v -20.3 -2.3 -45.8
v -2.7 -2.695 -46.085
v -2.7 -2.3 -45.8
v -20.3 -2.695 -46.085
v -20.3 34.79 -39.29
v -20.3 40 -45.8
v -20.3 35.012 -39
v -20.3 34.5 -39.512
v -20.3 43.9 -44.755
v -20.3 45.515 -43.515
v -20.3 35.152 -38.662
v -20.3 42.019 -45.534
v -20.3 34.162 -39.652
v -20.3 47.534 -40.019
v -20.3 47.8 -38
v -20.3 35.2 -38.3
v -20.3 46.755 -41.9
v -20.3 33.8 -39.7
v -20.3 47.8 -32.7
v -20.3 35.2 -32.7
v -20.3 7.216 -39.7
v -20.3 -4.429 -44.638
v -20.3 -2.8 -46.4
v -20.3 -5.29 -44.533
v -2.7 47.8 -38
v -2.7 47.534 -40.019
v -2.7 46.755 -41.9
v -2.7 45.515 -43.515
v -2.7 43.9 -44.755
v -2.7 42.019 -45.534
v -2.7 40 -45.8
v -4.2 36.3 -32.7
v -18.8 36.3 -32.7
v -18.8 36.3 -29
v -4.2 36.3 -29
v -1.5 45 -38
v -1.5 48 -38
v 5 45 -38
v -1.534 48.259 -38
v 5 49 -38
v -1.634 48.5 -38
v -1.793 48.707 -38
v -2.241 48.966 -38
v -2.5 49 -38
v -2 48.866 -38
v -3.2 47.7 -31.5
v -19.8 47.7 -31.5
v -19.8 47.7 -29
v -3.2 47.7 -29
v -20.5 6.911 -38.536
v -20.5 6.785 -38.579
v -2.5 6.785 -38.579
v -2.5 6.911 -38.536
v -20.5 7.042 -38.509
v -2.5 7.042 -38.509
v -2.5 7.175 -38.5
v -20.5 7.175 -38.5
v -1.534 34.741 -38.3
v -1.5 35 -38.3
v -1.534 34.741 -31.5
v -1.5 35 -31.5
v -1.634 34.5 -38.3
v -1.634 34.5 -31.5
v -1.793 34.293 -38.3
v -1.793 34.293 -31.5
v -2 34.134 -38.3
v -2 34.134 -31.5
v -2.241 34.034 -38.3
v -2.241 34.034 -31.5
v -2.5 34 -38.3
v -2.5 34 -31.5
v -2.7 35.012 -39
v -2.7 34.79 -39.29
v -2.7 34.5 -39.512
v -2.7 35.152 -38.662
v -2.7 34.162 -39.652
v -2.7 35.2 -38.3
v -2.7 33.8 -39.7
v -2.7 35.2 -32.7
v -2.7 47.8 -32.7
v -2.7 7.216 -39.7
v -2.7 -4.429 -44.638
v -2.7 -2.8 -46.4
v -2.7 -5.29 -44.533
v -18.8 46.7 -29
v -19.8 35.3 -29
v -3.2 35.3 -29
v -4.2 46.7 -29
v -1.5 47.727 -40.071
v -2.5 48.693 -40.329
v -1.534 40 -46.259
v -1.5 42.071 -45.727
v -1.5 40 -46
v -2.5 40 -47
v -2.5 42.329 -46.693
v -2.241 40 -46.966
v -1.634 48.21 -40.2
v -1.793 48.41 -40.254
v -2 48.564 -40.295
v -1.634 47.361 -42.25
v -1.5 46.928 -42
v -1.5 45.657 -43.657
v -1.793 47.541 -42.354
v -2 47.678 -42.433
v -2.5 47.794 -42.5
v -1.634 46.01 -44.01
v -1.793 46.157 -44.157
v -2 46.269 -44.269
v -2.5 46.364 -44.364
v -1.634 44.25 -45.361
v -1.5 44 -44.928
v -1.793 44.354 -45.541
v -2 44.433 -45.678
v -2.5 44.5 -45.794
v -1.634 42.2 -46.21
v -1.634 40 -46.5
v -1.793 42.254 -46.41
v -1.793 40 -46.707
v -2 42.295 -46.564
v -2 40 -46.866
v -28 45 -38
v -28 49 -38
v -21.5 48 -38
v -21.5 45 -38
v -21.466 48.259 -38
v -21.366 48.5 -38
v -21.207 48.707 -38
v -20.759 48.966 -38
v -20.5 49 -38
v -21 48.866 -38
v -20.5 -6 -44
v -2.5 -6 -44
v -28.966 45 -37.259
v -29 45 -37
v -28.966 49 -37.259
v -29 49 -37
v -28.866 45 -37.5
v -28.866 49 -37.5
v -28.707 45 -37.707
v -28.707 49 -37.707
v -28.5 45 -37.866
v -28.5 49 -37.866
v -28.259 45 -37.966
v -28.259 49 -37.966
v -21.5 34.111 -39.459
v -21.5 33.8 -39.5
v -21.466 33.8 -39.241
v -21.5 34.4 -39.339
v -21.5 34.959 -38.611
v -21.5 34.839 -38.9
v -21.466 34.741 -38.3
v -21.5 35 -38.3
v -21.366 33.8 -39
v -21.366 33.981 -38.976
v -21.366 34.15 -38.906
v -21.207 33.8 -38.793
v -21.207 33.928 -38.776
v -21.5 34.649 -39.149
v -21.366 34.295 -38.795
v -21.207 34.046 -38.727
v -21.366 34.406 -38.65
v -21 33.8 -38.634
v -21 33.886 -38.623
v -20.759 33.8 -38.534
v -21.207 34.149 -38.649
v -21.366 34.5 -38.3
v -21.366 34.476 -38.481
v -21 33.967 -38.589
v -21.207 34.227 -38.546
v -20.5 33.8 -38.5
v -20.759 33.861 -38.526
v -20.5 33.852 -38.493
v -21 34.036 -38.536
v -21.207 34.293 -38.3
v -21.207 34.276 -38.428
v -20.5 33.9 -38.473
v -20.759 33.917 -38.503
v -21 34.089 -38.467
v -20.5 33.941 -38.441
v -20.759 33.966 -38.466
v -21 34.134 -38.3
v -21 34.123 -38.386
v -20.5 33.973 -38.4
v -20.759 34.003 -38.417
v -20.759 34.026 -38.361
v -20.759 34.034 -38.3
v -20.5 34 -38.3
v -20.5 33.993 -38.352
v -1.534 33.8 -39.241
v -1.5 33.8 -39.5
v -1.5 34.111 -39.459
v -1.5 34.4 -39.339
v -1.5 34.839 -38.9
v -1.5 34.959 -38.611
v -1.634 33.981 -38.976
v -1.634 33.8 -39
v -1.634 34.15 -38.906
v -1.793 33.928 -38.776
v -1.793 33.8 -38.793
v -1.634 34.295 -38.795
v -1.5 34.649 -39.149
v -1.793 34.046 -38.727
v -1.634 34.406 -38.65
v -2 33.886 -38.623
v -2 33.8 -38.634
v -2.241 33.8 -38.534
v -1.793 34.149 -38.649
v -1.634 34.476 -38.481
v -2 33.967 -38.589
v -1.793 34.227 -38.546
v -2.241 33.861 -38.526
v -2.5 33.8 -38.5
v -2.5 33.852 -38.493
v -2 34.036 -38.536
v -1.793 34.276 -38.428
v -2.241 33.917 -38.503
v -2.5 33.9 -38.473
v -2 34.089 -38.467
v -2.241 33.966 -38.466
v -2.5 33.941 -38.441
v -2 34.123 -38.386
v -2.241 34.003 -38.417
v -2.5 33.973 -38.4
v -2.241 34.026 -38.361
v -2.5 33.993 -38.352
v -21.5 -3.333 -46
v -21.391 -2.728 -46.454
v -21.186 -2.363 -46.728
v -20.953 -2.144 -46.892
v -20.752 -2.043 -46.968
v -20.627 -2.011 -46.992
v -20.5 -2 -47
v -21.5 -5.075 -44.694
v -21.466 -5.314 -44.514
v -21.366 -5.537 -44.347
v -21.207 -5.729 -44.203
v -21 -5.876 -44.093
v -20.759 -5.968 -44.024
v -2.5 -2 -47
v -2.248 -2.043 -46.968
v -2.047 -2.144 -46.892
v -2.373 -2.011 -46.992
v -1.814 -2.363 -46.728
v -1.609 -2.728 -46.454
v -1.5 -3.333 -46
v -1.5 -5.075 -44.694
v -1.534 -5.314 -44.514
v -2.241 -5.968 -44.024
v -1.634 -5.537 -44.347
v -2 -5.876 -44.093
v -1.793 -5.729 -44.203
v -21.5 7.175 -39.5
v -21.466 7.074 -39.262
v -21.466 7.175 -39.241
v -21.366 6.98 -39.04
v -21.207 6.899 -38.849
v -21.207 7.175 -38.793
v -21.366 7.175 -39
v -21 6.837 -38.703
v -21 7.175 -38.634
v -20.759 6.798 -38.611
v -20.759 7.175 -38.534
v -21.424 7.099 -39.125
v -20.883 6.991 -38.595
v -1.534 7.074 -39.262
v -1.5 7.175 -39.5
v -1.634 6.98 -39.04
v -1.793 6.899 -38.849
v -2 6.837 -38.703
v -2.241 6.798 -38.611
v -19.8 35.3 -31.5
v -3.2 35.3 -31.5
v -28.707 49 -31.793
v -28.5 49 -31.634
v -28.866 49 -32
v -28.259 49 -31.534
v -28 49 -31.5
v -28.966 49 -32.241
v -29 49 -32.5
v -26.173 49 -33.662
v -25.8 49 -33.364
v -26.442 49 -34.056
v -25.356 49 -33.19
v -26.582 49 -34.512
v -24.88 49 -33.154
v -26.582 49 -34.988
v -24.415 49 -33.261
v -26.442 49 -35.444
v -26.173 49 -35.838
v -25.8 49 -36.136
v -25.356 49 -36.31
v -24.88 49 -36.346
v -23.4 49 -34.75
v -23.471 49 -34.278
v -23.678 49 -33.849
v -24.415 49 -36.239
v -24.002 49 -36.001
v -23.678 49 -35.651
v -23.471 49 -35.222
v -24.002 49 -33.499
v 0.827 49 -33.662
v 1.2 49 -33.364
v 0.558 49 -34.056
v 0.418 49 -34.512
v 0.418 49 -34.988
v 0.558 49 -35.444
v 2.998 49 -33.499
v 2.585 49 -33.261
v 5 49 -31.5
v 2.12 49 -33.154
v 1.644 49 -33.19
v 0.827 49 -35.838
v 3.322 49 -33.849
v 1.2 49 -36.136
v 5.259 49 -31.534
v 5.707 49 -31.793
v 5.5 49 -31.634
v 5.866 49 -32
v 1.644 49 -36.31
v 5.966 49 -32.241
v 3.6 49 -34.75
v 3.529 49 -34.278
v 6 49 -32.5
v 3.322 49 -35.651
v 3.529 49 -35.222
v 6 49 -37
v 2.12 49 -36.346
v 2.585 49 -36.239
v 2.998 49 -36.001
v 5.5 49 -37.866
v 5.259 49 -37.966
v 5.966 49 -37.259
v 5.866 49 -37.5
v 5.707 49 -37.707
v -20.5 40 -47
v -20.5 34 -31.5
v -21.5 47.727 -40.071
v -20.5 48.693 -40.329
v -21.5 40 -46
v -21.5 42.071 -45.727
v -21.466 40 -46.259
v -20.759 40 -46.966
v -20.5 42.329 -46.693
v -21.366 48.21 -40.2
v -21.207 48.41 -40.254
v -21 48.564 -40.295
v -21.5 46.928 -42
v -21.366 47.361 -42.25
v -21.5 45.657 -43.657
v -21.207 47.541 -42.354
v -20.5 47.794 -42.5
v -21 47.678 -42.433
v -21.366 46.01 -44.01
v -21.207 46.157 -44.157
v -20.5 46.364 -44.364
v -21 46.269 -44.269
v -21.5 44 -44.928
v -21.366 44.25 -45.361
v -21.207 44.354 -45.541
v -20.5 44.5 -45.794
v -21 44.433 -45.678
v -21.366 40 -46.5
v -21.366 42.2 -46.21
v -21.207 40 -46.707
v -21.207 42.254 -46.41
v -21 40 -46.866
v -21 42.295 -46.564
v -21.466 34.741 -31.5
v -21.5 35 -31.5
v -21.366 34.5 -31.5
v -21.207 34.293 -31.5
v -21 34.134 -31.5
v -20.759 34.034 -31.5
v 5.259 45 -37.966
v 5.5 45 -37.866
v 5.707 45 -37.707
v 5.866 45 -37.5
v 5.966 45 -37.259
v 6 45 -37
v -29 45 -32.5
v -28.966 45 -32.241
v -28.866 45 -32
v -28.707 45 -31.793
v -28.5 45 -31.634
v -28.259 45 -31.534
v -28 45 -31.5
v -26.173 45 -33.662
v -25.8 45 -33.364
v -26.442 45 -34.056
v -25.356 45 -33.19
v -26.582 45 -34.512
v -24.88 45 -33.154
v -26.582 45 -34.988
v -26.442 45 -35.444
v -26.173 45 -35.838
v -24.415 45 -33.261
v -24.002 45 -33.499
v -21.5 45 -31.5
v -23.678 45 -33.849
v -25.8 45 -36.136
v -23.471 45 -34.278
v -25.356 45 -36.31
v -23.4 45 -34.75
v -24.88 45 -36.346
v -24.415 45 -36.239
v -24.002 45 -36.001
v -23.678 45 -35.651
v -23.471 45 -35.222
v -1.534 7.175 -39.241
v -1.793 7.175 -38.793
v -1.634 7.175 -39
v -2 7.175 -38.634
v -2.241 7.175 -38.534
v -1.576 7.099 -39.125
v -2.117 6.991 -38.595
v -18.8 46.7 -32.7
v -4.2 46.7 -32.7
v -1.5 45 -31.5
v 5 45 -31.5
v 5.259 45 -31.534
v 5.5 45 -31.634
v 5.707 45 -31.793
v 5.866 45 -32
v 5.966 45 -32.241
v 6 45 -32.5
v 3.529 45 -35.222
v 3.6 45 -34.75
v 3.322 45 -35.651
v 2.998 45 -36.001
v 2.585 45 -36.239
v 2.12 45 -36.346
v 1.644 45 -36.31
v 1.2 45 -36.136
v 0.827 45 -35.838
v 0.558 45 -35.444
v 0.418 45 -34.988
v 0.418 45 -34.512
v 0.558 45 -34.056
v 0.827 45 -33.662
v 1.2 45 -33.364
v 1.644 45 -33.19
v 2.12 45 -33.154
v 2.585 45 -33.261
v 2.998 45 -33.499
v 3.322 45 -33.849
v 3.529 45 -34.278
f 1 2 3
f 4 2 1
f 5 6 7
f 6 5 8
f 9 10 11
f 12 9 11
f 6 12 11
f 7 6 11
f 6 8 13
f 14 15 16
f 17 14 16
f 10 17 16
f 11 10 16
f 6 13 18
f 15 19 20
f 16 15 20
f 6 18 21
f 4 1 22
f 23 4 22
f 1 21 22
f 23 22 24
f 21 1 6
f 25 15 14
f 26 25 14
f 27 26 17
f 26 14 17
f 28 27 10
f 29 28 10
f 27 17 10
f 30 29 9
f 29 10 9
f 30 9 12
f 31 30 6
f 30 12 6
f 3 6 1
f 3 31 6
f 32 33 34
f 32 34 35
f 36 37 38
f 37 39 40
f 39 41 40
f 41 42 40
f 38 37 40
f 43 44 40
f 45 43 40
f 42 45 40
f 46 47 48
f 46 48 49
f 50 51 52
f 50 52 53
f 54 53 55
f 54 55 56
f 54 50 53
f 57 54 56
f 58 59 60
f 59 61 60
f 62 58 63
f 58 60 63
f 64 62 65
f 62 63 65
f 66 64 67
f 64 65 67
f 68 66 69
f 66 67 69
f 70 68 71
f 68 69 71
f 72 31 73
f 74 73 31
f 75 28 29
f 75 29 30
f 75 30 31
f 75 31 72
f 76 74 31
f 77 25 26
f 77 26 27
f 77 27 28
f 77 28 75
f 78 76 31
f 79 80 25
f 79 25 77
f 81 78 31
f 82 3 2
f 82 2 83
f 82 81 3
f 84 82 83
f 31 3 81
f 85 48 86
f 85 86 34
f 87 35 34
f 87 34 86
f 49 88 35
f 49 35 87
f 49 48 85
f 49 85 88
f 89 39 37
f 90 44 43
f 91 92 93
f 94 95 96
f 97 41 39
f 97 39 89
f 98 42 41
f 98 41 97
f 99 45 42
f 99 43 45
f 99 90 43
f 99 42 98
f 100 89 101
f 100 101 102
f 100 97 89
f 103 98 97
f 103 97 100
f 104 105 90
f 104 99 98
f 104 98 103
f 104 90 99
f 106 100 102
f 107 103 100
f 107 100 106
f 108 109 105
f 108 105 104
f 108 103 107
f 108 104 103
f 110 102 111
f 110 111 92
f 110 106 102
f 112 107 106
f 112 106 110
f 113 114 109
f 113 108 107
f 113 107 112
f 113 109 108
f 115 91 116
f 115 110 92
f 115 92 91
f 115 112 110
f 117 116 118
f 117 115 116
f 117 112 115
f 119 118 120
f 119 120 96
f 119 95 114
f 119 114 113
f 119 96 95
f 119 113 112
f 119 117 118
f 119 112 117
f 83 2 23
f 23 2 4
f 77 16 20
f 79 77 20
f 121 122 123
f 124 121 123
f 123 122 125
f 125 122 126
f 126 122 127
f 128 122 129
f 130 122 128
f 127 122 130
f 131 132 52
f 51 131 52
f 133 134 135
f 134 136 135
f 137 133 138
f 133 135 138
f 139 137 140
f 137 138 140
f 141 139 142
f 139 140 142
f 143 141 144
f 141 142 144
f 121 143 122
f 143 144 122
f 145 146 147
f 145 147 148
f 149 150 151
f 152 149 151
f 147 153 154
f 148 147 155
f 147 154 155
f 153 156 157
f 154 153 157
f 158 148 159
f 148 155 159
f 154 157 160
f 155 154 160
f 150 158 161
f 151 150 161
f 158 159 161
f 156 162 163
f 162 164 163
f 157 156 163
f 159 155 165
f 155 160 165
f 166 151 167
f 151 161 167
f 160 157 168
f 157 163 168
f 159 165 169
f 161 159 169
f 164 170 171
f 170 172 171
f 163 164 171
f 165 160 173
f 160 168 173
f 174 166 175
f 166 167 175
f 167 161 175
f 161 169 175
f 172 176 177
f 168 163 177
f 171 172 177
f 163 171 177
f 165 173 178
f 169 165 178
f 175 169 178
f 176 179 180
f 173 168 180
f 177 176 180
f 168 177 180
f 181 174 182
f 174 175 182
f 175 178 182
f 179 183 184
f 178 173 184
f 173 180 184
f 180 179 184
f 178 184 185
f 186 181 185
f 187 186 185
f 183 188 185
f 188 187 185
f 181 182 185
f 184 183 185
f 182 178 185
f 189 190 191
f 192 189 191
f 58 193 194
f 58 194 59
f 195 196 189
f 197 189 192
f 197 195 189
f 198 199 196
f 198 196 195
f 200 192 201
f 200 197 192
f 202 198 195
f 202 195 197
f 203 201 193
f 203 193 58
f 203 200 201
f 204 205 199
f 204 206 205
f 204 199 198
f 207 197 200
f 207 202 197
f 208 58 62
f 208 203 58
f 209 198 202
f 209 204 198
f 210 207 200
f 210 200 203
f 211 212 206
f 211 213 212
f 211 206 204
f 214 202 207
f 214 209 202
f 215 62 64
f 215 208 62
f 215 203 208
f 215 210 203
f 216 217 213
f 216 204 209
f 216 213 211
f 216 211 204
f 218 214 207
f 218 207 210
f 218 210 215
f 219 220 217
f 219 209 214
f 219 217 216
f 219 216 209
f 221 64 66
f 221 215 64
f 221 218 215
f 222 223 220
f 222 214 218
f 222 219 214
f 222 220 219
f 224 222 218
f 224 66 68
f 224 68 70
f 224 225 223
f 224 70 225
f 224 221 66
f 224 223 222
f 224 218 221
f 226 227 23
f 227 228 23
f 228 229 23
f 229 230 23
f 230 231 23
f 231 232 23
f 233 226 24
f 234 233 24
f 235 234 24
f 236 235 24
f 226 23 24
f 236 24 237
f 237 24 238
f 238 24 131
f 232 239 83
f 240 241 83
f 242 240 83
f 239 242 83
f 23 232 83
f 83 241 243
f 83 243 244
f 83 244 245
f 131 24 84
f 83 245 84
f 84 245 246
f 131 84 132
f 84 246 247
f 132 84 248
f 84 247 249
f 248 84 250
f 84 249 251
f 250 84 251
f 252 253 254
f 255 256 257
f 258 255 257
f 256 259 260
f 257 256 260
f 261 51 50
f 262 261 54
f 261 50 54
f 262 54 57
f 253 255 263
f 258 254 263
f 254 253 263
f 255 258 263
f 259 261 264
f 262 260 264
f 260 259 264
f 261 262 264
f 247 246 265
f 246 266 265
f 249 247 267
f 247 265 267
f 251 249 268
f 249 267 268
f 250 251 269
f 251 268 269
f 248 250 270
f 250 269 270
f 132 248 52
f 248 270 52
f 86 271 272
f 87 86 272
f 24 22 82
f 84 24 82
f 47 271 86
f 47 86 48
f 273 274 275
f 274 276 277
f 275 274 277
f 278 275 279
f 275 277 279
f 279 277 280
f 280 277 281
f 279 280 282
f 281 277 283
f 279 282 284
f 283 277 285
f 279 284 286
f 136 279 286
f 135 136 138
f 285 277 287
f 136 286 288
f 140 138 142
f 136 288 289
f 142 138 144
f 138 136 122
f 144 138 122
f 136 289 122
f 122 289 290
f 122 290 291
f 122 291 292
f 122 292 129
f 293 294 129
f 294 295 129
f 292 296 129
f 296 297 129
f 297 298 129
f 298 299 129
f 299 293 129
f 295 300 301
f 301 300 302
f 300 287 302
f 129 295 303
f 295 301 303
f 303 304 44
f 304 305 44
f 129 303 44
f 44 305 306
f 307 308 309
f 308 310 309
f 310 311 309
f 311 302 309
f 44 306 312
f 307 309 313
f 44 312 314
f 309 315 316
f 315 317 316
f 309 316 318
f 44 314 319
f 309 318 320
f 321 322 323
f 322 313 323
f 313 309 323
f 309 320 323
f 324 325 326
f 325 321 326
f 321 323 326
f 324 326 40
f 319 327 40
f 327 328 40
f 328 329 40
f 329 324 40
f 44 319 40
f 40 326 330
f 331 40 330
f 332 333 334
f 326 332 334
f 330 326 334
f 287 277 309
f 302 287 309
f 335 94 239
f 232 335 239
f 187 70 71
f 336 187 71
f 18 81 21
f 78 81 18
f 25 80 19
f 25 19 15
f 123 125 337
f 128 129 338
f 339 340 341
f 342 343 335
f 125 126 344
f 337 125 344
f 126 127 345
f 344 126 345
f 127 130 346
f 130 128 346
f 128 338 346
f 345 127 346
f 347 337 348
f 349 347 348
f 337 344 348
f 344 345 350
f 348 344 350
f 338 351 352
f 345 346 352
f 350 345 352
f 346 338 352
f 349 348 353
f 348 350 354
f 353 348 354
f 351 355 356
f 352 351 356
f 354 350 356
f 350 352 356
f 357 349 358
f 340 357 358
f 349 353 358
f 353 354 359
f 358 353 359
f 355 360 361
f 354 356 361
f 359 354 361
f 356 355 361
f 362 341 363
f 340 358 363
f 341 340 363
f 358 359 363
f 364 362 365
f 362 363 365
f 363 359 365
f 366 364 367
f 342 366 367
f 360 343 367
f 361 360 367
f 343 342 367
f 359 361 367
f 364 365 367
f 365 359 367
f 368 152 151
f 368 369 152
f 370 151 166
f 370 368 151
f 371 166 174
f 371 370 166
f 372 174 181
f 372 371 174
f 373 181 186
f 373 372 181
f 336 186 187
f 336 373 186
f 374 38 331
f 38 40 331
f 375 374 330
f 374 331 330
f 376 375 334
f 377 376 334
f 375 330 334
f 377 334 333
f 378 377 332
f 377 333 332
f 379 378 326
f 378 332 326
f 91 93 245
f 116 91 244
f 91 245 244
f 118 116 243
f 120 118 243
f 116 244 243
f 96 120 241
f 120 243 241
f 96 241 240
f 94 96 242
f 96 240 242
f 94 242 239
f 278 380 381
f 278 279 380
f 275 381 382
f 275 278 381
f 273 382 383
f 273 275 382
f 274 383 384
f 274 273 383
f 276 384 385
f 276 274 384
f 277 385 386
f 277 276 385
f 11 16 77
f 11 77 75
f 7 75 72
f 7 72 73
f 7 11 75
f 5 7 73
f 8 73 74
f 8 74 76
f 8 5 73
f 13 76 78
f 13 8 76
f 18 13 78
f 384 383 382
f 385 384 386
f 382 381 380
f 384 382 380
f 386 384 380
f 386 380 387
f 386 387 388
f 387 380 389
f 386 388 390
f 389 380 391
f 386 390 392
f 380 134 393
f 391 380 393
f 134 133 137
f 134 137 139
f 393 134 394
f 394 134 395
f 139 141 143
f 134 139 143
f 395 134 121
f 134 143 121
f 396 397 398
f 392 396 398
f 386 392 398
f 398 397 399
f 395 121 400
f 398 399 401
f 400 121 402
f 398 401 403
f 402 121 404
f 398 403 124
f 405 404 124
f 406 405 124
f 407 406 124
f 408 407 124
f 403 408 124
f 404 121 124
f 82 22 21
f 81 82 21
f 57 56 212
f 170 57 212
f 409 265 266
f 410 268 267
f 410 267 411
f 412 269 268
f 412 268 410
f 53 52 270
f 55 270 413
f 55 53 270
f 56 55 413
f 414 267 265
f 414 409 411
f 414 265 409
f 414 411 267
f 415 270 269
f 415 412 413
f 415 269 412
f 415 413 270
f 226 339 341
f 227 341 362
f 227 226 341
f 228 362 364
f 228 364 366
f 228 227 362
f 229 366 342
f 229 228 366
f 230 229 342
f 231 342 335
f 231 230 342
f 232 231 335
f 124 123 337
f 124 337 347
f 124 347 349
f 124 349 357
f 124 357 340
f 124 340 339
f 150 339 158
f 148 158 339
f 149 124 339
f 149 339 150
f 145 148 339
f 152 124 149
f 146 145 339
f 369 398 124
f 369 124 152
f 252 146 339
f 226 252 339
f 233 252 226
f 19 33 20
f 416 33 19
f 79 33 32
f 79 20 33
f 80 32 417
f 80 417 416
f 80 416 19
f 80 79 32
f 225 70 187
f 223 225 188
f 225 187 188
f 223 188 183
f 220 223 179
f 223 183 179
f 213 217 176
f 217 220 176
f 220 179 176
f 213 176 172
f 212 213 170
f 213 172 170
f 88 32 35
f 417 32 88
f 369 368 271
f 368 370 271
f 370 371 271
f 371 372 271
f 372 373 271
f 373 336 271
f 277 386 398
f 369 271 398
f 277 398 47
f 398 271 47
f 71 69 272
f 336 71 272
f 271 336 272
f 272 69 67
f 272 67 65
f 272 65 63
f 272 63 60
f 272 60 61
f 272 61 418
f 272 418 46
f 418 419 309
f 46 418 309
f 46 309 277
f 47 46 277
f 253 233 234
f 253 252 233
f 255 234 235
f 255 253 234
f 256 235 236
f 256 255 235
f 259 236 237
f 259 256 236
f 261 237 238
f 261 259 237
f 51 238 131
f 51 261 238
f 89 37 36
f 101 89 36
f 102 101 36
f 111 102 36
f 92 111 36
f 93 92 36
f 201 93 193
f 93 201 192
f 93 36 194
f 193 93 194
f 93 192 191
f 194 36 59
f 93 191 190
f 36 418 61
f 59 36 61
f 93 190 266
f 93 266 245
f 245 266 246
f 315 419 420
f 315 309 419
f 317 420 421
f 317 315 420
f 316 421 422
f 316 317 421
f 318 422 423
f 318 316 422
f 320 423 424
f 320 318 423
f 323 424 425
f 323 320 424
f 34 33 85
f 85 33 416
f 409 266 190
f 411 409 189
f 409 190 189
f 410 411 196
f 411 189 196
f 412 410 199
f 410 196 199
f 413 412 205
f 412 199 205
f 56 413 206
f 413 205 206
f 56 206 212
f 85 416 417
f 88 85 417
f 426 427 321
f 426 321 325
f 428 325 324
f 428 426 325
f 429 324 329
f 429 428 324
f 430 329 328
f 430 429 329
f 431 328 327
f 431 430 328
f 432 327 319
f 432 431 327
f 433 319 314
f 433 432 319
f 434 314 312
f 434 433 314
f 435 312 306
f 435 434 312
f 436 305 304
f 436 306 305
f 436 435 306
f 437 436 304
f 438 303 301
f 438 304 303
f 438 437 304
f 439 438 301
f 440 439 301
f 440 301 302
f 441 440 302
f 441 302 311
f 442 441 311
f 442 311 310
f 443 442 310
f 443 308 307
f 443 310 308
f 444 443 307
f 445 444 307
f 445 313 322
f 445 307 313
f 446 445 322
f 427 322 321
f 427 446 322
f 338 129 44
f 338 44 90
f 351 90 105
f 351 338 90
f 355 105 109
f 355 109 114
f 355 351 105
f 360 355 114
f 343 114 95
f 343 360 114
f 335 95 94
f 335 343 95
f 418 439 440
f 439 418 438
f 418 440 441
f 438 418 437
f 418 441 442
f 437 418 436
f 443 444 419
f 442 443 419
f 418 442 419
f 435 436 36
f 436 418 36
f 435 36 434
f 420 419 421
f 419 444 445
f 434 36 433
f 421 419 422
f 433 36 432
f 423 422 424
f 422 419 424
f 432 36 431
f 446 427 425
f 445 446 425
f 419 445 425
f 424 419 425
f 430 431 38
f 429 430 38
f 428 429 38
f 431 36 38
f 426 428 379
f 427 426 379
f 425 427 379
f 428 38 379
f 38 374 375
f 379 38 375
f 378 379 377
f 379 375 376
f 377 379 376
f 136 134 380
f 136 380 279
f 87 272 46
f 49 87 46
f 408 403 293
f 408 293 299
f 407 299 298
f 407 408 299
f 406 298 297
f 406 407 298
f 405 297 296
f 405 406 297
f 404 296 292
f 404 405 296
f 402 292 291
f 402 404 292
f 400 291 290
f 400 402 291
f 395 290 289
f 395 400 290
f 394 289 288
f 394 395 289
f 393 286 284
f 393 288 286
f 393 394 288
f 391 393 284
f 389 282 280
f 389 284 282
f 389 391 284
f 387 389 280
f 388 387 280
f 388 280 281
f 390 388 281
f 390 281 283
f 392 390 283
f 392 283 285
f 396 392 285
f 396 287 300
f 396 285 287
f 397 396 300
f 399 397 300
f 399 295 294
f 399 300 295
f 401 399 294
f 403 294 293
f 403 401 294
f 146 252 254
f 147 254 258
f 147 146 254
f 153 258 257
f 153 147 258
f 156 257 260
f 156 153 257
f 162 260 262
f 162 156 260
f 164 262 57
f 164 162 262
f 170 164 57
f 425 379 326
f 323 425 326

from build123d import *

# Parameters (mm, degrees)
CYLINDER037_R          = 1.6
CYLINDER037_DEPTH      = 30
CYLINDER037_ROLL_ANGLE = -90
CYLINDER036_R          = 1.6
CYLINDER036_DEPTH      = 30
CYLINDER036_ROLL_ANGLE = -90
BOX034_W               = 8.25
BOX034_H               = 4
BOX034_DEPTH           = 6.5
BOX035_W               = 8.25
BOX035_H               = 4
BOX035_DEPTH           = 6.5
FILLET028_R            = 1
BOX037_W               = 14.6
BOX037_H               = 10.4
BOX037_DEPTH           = 12
BOX036_W               = 16.6
BOX036_H               = 12.4
BOX036_DEPTH           = 3
PAD012_DEPTH           = 20
FILLET029_1_R          = 9
FILLET029_2_R          = 0.2
THICKNESS001_T         = -1.2
CHAMFER009_1_SIZE      = 1
CHAMFER009_2_SIZE      = 0.5
FILLET030_R            = 1
CHAMFER010_SIZE        = 0.3


with BuildPart() as cylinder037:
    # Cylinder037 → Cylinder037 (new body)
    with BuildSketch(Plane.XY):
        Circle(CYLINDER037_R)
    extrude(amount=CYLINDER037_DEPTH)


with BuildPart() as cylinder037_1:
    # Cylinder037 roll: moved
    add(cylinder037.part.rotate(Axis((0, 0, 0), (1, 0, 0)), CYLINDER037_ROLL_ANGLE))


with BuildPart() as cylinder037_2:
    # Cylinder037 placement: moved
    add(cylinder037_1.part.moved(Location((-25, 27, -34.75))))


with BuildPart() as fusion033:
    # Cylinder036 → Cylinder036 (new body)
    with BuildSketch(Plane.XY):
        Circle(CYLINDER036_R)
    extrude(amount=CYLINDER036_DEPTH)


with BuildPart() as fusion033_1:
    # Cylinder036 roll: moved
    add(fusion033.part.rotate(Axis((0, 0, 0), (1, 0, 0)), CYLINDER036_ROLL_ANGLE))


with BuildPart() as fusion033_2:
    # Cylinder036 placement: moved
    add(fusion033_1.part.moved(Location((2, 27, -34.75))))

    # Fusion033: union Cylinder037
    add(cylinder037_2.part)


with BuildPart() as cube034:
    # Box034 → Box034 (new body)
    with BuildSketch(Plane(origin=(-29, 45, -38), x_dir=(1, 0, 0), z_dir=(0, 0, 1))):
        with Locations((4.125, 2)):
            Rectangle(BOX034_W, BOX034_H)
    extrude(amount=BOX034_DEPTH)


with BuildPart() as fillet028:
    # Box035 → Box035 (new body)
    with BuildSketch(Plane(origin=(-2.25, 45, -38), x_dir=(1, 0, 0), z_dir=(0, 0, 1))):
        with Locations((4.125, 2)):
            Rectangle(BOX035_W, BOX035_H)
    extrude(amount=BOX035_DEPTH)

    # Fusion032: union Cube034
    add(cube034.part)

    # Cut039: cut Fusion033
    add(fusion033_2.part, mode=Mode.SUBTRACT)

    # Fillet028
    fillet028_edges = [fillet028.edges().sort_by_distance(p)[0] for p in [
        (6, 47, -31.5),
        (6, 47, -38),
        (-29, 47, -31.5),
        (-29, 47, -38),
    ]]
    fillet(fillet028_edges, radius=FILLET028_R)


with BuildPart() as cube037:
    # Box037 → Box037 (new body)
    with BuildSketch(Plane(origin=(-18.8, 36.3, -39), x_dir=(1, 0, 0), z_dir=(0, 0, 1))):
        with Locations((7.3, 5.2)):
            Rectangle(BOX037_W, BOX037_H)
    extrude(amount=BOX037_DEPTH)


with BuildPart() as cube036:
    # Box036 → Box036 (new body)
    with BuildSketch(Plane(origin=(-19.8, 35.3, -32), x_dir=(1, 0, 0), z_dir=(0, 0, 1))):
        with Locations((8.3, 6.2)):
            Rectangle(BOX036_W, BOX036_H)
    extrude(amount=BOX036_DEPTH)


with BuildPart() as chamfer010:
    # Sketch014 → Pad012 (new body)
    with BuildSketch(Plane(origin=(-1.5, 4, 0), x_dir=(0, 1, 0), z_dir=(1, 0, 0))):
        Polygon((-10, -44), (2.97206, -38.5), (30, -38.5), (30, -31.5), (45, -31.5), (45, -47), (-6, -47), align=None)
    extrude(amount=-PAD012_DEPTH)

    # Fillet029 1
    fillet029_1_edges = [chamfer010.edges().sort_by_distance(p)[0] for p in [
        (-11.5, 49, -47),
    ]]
    fillet(fillet029_1_edges, radius=FILLET029_1_R)

    # Fillet029 2
    fillet029_2_edges = [chamfer010.edges().sort_by_distance(p)[0] for p in [
        (-11.5, 34, -38.5),
    ]]
    fillet(fillet029_2_edges, radius=FILLET029_2_R)

    # Thickness001
    thickness001_openings = [chamfer010.faces().sort_by_distance(p)[0] for p in [
        (-11.5, -4, -45.5),
    ]]
    offset(amount=THICKNESS001_T, openings=thickness001_openings)

    # Fusion034: union Cube036
    add(cube036.part)

    # Cut040: cut Cube037
    add(cube037.part, mode=Mode.SUBTRACT)

    # Chamfer009 1
    chamfer009_1_edges = [chamfer010.edges().sort_by_distance(p)[0] for p in [
        (-11.5, -3.6, -45.8),
    ]]
    chamfer(chamfer009_1_edges, length=CHAMFER009_1_SIZE)

    # Chamfer009 2
    chamfer009_2_edges = [chamfer010.edges().sort_by_distance(p)[0] for p in [
        (-11.5, -4.889764, -44.832677),
    ]]
    chamfer(chamfer009_2_edges, length=CHAMFER009_2_SIZE)

    # Fusion035: union Fillet028
    add(fillet028.part)

    # Fillet030
    fillet030_edges = [chamfer010.edges().sort_by_distance(p)[0] for p in [
        (-1.5, 19, -47),
        (-21.5, 19, -47),
        (-1.5, 0.48603, -41.25),
        (-1.5, 20.38603, -38.5),
        (-11.5, 6.97206, -38.5),
        (-21.5, 0.48603, -41.25),
        (-21.5, 20.38603, -38.5),
    ]]
    fillet(fillet030_edges, radius=FILLET030_R)

    # Chamfer010
    chamfer010_edges = [chamfer010.edges().sort_by_distance(p)[0] for p in [
        (-11.5, -2.6, -45.8),
    ]]
    chamfer(chamfer010_edges, length=CHAMFER010_SIZE)


solid = chamfer010.part
